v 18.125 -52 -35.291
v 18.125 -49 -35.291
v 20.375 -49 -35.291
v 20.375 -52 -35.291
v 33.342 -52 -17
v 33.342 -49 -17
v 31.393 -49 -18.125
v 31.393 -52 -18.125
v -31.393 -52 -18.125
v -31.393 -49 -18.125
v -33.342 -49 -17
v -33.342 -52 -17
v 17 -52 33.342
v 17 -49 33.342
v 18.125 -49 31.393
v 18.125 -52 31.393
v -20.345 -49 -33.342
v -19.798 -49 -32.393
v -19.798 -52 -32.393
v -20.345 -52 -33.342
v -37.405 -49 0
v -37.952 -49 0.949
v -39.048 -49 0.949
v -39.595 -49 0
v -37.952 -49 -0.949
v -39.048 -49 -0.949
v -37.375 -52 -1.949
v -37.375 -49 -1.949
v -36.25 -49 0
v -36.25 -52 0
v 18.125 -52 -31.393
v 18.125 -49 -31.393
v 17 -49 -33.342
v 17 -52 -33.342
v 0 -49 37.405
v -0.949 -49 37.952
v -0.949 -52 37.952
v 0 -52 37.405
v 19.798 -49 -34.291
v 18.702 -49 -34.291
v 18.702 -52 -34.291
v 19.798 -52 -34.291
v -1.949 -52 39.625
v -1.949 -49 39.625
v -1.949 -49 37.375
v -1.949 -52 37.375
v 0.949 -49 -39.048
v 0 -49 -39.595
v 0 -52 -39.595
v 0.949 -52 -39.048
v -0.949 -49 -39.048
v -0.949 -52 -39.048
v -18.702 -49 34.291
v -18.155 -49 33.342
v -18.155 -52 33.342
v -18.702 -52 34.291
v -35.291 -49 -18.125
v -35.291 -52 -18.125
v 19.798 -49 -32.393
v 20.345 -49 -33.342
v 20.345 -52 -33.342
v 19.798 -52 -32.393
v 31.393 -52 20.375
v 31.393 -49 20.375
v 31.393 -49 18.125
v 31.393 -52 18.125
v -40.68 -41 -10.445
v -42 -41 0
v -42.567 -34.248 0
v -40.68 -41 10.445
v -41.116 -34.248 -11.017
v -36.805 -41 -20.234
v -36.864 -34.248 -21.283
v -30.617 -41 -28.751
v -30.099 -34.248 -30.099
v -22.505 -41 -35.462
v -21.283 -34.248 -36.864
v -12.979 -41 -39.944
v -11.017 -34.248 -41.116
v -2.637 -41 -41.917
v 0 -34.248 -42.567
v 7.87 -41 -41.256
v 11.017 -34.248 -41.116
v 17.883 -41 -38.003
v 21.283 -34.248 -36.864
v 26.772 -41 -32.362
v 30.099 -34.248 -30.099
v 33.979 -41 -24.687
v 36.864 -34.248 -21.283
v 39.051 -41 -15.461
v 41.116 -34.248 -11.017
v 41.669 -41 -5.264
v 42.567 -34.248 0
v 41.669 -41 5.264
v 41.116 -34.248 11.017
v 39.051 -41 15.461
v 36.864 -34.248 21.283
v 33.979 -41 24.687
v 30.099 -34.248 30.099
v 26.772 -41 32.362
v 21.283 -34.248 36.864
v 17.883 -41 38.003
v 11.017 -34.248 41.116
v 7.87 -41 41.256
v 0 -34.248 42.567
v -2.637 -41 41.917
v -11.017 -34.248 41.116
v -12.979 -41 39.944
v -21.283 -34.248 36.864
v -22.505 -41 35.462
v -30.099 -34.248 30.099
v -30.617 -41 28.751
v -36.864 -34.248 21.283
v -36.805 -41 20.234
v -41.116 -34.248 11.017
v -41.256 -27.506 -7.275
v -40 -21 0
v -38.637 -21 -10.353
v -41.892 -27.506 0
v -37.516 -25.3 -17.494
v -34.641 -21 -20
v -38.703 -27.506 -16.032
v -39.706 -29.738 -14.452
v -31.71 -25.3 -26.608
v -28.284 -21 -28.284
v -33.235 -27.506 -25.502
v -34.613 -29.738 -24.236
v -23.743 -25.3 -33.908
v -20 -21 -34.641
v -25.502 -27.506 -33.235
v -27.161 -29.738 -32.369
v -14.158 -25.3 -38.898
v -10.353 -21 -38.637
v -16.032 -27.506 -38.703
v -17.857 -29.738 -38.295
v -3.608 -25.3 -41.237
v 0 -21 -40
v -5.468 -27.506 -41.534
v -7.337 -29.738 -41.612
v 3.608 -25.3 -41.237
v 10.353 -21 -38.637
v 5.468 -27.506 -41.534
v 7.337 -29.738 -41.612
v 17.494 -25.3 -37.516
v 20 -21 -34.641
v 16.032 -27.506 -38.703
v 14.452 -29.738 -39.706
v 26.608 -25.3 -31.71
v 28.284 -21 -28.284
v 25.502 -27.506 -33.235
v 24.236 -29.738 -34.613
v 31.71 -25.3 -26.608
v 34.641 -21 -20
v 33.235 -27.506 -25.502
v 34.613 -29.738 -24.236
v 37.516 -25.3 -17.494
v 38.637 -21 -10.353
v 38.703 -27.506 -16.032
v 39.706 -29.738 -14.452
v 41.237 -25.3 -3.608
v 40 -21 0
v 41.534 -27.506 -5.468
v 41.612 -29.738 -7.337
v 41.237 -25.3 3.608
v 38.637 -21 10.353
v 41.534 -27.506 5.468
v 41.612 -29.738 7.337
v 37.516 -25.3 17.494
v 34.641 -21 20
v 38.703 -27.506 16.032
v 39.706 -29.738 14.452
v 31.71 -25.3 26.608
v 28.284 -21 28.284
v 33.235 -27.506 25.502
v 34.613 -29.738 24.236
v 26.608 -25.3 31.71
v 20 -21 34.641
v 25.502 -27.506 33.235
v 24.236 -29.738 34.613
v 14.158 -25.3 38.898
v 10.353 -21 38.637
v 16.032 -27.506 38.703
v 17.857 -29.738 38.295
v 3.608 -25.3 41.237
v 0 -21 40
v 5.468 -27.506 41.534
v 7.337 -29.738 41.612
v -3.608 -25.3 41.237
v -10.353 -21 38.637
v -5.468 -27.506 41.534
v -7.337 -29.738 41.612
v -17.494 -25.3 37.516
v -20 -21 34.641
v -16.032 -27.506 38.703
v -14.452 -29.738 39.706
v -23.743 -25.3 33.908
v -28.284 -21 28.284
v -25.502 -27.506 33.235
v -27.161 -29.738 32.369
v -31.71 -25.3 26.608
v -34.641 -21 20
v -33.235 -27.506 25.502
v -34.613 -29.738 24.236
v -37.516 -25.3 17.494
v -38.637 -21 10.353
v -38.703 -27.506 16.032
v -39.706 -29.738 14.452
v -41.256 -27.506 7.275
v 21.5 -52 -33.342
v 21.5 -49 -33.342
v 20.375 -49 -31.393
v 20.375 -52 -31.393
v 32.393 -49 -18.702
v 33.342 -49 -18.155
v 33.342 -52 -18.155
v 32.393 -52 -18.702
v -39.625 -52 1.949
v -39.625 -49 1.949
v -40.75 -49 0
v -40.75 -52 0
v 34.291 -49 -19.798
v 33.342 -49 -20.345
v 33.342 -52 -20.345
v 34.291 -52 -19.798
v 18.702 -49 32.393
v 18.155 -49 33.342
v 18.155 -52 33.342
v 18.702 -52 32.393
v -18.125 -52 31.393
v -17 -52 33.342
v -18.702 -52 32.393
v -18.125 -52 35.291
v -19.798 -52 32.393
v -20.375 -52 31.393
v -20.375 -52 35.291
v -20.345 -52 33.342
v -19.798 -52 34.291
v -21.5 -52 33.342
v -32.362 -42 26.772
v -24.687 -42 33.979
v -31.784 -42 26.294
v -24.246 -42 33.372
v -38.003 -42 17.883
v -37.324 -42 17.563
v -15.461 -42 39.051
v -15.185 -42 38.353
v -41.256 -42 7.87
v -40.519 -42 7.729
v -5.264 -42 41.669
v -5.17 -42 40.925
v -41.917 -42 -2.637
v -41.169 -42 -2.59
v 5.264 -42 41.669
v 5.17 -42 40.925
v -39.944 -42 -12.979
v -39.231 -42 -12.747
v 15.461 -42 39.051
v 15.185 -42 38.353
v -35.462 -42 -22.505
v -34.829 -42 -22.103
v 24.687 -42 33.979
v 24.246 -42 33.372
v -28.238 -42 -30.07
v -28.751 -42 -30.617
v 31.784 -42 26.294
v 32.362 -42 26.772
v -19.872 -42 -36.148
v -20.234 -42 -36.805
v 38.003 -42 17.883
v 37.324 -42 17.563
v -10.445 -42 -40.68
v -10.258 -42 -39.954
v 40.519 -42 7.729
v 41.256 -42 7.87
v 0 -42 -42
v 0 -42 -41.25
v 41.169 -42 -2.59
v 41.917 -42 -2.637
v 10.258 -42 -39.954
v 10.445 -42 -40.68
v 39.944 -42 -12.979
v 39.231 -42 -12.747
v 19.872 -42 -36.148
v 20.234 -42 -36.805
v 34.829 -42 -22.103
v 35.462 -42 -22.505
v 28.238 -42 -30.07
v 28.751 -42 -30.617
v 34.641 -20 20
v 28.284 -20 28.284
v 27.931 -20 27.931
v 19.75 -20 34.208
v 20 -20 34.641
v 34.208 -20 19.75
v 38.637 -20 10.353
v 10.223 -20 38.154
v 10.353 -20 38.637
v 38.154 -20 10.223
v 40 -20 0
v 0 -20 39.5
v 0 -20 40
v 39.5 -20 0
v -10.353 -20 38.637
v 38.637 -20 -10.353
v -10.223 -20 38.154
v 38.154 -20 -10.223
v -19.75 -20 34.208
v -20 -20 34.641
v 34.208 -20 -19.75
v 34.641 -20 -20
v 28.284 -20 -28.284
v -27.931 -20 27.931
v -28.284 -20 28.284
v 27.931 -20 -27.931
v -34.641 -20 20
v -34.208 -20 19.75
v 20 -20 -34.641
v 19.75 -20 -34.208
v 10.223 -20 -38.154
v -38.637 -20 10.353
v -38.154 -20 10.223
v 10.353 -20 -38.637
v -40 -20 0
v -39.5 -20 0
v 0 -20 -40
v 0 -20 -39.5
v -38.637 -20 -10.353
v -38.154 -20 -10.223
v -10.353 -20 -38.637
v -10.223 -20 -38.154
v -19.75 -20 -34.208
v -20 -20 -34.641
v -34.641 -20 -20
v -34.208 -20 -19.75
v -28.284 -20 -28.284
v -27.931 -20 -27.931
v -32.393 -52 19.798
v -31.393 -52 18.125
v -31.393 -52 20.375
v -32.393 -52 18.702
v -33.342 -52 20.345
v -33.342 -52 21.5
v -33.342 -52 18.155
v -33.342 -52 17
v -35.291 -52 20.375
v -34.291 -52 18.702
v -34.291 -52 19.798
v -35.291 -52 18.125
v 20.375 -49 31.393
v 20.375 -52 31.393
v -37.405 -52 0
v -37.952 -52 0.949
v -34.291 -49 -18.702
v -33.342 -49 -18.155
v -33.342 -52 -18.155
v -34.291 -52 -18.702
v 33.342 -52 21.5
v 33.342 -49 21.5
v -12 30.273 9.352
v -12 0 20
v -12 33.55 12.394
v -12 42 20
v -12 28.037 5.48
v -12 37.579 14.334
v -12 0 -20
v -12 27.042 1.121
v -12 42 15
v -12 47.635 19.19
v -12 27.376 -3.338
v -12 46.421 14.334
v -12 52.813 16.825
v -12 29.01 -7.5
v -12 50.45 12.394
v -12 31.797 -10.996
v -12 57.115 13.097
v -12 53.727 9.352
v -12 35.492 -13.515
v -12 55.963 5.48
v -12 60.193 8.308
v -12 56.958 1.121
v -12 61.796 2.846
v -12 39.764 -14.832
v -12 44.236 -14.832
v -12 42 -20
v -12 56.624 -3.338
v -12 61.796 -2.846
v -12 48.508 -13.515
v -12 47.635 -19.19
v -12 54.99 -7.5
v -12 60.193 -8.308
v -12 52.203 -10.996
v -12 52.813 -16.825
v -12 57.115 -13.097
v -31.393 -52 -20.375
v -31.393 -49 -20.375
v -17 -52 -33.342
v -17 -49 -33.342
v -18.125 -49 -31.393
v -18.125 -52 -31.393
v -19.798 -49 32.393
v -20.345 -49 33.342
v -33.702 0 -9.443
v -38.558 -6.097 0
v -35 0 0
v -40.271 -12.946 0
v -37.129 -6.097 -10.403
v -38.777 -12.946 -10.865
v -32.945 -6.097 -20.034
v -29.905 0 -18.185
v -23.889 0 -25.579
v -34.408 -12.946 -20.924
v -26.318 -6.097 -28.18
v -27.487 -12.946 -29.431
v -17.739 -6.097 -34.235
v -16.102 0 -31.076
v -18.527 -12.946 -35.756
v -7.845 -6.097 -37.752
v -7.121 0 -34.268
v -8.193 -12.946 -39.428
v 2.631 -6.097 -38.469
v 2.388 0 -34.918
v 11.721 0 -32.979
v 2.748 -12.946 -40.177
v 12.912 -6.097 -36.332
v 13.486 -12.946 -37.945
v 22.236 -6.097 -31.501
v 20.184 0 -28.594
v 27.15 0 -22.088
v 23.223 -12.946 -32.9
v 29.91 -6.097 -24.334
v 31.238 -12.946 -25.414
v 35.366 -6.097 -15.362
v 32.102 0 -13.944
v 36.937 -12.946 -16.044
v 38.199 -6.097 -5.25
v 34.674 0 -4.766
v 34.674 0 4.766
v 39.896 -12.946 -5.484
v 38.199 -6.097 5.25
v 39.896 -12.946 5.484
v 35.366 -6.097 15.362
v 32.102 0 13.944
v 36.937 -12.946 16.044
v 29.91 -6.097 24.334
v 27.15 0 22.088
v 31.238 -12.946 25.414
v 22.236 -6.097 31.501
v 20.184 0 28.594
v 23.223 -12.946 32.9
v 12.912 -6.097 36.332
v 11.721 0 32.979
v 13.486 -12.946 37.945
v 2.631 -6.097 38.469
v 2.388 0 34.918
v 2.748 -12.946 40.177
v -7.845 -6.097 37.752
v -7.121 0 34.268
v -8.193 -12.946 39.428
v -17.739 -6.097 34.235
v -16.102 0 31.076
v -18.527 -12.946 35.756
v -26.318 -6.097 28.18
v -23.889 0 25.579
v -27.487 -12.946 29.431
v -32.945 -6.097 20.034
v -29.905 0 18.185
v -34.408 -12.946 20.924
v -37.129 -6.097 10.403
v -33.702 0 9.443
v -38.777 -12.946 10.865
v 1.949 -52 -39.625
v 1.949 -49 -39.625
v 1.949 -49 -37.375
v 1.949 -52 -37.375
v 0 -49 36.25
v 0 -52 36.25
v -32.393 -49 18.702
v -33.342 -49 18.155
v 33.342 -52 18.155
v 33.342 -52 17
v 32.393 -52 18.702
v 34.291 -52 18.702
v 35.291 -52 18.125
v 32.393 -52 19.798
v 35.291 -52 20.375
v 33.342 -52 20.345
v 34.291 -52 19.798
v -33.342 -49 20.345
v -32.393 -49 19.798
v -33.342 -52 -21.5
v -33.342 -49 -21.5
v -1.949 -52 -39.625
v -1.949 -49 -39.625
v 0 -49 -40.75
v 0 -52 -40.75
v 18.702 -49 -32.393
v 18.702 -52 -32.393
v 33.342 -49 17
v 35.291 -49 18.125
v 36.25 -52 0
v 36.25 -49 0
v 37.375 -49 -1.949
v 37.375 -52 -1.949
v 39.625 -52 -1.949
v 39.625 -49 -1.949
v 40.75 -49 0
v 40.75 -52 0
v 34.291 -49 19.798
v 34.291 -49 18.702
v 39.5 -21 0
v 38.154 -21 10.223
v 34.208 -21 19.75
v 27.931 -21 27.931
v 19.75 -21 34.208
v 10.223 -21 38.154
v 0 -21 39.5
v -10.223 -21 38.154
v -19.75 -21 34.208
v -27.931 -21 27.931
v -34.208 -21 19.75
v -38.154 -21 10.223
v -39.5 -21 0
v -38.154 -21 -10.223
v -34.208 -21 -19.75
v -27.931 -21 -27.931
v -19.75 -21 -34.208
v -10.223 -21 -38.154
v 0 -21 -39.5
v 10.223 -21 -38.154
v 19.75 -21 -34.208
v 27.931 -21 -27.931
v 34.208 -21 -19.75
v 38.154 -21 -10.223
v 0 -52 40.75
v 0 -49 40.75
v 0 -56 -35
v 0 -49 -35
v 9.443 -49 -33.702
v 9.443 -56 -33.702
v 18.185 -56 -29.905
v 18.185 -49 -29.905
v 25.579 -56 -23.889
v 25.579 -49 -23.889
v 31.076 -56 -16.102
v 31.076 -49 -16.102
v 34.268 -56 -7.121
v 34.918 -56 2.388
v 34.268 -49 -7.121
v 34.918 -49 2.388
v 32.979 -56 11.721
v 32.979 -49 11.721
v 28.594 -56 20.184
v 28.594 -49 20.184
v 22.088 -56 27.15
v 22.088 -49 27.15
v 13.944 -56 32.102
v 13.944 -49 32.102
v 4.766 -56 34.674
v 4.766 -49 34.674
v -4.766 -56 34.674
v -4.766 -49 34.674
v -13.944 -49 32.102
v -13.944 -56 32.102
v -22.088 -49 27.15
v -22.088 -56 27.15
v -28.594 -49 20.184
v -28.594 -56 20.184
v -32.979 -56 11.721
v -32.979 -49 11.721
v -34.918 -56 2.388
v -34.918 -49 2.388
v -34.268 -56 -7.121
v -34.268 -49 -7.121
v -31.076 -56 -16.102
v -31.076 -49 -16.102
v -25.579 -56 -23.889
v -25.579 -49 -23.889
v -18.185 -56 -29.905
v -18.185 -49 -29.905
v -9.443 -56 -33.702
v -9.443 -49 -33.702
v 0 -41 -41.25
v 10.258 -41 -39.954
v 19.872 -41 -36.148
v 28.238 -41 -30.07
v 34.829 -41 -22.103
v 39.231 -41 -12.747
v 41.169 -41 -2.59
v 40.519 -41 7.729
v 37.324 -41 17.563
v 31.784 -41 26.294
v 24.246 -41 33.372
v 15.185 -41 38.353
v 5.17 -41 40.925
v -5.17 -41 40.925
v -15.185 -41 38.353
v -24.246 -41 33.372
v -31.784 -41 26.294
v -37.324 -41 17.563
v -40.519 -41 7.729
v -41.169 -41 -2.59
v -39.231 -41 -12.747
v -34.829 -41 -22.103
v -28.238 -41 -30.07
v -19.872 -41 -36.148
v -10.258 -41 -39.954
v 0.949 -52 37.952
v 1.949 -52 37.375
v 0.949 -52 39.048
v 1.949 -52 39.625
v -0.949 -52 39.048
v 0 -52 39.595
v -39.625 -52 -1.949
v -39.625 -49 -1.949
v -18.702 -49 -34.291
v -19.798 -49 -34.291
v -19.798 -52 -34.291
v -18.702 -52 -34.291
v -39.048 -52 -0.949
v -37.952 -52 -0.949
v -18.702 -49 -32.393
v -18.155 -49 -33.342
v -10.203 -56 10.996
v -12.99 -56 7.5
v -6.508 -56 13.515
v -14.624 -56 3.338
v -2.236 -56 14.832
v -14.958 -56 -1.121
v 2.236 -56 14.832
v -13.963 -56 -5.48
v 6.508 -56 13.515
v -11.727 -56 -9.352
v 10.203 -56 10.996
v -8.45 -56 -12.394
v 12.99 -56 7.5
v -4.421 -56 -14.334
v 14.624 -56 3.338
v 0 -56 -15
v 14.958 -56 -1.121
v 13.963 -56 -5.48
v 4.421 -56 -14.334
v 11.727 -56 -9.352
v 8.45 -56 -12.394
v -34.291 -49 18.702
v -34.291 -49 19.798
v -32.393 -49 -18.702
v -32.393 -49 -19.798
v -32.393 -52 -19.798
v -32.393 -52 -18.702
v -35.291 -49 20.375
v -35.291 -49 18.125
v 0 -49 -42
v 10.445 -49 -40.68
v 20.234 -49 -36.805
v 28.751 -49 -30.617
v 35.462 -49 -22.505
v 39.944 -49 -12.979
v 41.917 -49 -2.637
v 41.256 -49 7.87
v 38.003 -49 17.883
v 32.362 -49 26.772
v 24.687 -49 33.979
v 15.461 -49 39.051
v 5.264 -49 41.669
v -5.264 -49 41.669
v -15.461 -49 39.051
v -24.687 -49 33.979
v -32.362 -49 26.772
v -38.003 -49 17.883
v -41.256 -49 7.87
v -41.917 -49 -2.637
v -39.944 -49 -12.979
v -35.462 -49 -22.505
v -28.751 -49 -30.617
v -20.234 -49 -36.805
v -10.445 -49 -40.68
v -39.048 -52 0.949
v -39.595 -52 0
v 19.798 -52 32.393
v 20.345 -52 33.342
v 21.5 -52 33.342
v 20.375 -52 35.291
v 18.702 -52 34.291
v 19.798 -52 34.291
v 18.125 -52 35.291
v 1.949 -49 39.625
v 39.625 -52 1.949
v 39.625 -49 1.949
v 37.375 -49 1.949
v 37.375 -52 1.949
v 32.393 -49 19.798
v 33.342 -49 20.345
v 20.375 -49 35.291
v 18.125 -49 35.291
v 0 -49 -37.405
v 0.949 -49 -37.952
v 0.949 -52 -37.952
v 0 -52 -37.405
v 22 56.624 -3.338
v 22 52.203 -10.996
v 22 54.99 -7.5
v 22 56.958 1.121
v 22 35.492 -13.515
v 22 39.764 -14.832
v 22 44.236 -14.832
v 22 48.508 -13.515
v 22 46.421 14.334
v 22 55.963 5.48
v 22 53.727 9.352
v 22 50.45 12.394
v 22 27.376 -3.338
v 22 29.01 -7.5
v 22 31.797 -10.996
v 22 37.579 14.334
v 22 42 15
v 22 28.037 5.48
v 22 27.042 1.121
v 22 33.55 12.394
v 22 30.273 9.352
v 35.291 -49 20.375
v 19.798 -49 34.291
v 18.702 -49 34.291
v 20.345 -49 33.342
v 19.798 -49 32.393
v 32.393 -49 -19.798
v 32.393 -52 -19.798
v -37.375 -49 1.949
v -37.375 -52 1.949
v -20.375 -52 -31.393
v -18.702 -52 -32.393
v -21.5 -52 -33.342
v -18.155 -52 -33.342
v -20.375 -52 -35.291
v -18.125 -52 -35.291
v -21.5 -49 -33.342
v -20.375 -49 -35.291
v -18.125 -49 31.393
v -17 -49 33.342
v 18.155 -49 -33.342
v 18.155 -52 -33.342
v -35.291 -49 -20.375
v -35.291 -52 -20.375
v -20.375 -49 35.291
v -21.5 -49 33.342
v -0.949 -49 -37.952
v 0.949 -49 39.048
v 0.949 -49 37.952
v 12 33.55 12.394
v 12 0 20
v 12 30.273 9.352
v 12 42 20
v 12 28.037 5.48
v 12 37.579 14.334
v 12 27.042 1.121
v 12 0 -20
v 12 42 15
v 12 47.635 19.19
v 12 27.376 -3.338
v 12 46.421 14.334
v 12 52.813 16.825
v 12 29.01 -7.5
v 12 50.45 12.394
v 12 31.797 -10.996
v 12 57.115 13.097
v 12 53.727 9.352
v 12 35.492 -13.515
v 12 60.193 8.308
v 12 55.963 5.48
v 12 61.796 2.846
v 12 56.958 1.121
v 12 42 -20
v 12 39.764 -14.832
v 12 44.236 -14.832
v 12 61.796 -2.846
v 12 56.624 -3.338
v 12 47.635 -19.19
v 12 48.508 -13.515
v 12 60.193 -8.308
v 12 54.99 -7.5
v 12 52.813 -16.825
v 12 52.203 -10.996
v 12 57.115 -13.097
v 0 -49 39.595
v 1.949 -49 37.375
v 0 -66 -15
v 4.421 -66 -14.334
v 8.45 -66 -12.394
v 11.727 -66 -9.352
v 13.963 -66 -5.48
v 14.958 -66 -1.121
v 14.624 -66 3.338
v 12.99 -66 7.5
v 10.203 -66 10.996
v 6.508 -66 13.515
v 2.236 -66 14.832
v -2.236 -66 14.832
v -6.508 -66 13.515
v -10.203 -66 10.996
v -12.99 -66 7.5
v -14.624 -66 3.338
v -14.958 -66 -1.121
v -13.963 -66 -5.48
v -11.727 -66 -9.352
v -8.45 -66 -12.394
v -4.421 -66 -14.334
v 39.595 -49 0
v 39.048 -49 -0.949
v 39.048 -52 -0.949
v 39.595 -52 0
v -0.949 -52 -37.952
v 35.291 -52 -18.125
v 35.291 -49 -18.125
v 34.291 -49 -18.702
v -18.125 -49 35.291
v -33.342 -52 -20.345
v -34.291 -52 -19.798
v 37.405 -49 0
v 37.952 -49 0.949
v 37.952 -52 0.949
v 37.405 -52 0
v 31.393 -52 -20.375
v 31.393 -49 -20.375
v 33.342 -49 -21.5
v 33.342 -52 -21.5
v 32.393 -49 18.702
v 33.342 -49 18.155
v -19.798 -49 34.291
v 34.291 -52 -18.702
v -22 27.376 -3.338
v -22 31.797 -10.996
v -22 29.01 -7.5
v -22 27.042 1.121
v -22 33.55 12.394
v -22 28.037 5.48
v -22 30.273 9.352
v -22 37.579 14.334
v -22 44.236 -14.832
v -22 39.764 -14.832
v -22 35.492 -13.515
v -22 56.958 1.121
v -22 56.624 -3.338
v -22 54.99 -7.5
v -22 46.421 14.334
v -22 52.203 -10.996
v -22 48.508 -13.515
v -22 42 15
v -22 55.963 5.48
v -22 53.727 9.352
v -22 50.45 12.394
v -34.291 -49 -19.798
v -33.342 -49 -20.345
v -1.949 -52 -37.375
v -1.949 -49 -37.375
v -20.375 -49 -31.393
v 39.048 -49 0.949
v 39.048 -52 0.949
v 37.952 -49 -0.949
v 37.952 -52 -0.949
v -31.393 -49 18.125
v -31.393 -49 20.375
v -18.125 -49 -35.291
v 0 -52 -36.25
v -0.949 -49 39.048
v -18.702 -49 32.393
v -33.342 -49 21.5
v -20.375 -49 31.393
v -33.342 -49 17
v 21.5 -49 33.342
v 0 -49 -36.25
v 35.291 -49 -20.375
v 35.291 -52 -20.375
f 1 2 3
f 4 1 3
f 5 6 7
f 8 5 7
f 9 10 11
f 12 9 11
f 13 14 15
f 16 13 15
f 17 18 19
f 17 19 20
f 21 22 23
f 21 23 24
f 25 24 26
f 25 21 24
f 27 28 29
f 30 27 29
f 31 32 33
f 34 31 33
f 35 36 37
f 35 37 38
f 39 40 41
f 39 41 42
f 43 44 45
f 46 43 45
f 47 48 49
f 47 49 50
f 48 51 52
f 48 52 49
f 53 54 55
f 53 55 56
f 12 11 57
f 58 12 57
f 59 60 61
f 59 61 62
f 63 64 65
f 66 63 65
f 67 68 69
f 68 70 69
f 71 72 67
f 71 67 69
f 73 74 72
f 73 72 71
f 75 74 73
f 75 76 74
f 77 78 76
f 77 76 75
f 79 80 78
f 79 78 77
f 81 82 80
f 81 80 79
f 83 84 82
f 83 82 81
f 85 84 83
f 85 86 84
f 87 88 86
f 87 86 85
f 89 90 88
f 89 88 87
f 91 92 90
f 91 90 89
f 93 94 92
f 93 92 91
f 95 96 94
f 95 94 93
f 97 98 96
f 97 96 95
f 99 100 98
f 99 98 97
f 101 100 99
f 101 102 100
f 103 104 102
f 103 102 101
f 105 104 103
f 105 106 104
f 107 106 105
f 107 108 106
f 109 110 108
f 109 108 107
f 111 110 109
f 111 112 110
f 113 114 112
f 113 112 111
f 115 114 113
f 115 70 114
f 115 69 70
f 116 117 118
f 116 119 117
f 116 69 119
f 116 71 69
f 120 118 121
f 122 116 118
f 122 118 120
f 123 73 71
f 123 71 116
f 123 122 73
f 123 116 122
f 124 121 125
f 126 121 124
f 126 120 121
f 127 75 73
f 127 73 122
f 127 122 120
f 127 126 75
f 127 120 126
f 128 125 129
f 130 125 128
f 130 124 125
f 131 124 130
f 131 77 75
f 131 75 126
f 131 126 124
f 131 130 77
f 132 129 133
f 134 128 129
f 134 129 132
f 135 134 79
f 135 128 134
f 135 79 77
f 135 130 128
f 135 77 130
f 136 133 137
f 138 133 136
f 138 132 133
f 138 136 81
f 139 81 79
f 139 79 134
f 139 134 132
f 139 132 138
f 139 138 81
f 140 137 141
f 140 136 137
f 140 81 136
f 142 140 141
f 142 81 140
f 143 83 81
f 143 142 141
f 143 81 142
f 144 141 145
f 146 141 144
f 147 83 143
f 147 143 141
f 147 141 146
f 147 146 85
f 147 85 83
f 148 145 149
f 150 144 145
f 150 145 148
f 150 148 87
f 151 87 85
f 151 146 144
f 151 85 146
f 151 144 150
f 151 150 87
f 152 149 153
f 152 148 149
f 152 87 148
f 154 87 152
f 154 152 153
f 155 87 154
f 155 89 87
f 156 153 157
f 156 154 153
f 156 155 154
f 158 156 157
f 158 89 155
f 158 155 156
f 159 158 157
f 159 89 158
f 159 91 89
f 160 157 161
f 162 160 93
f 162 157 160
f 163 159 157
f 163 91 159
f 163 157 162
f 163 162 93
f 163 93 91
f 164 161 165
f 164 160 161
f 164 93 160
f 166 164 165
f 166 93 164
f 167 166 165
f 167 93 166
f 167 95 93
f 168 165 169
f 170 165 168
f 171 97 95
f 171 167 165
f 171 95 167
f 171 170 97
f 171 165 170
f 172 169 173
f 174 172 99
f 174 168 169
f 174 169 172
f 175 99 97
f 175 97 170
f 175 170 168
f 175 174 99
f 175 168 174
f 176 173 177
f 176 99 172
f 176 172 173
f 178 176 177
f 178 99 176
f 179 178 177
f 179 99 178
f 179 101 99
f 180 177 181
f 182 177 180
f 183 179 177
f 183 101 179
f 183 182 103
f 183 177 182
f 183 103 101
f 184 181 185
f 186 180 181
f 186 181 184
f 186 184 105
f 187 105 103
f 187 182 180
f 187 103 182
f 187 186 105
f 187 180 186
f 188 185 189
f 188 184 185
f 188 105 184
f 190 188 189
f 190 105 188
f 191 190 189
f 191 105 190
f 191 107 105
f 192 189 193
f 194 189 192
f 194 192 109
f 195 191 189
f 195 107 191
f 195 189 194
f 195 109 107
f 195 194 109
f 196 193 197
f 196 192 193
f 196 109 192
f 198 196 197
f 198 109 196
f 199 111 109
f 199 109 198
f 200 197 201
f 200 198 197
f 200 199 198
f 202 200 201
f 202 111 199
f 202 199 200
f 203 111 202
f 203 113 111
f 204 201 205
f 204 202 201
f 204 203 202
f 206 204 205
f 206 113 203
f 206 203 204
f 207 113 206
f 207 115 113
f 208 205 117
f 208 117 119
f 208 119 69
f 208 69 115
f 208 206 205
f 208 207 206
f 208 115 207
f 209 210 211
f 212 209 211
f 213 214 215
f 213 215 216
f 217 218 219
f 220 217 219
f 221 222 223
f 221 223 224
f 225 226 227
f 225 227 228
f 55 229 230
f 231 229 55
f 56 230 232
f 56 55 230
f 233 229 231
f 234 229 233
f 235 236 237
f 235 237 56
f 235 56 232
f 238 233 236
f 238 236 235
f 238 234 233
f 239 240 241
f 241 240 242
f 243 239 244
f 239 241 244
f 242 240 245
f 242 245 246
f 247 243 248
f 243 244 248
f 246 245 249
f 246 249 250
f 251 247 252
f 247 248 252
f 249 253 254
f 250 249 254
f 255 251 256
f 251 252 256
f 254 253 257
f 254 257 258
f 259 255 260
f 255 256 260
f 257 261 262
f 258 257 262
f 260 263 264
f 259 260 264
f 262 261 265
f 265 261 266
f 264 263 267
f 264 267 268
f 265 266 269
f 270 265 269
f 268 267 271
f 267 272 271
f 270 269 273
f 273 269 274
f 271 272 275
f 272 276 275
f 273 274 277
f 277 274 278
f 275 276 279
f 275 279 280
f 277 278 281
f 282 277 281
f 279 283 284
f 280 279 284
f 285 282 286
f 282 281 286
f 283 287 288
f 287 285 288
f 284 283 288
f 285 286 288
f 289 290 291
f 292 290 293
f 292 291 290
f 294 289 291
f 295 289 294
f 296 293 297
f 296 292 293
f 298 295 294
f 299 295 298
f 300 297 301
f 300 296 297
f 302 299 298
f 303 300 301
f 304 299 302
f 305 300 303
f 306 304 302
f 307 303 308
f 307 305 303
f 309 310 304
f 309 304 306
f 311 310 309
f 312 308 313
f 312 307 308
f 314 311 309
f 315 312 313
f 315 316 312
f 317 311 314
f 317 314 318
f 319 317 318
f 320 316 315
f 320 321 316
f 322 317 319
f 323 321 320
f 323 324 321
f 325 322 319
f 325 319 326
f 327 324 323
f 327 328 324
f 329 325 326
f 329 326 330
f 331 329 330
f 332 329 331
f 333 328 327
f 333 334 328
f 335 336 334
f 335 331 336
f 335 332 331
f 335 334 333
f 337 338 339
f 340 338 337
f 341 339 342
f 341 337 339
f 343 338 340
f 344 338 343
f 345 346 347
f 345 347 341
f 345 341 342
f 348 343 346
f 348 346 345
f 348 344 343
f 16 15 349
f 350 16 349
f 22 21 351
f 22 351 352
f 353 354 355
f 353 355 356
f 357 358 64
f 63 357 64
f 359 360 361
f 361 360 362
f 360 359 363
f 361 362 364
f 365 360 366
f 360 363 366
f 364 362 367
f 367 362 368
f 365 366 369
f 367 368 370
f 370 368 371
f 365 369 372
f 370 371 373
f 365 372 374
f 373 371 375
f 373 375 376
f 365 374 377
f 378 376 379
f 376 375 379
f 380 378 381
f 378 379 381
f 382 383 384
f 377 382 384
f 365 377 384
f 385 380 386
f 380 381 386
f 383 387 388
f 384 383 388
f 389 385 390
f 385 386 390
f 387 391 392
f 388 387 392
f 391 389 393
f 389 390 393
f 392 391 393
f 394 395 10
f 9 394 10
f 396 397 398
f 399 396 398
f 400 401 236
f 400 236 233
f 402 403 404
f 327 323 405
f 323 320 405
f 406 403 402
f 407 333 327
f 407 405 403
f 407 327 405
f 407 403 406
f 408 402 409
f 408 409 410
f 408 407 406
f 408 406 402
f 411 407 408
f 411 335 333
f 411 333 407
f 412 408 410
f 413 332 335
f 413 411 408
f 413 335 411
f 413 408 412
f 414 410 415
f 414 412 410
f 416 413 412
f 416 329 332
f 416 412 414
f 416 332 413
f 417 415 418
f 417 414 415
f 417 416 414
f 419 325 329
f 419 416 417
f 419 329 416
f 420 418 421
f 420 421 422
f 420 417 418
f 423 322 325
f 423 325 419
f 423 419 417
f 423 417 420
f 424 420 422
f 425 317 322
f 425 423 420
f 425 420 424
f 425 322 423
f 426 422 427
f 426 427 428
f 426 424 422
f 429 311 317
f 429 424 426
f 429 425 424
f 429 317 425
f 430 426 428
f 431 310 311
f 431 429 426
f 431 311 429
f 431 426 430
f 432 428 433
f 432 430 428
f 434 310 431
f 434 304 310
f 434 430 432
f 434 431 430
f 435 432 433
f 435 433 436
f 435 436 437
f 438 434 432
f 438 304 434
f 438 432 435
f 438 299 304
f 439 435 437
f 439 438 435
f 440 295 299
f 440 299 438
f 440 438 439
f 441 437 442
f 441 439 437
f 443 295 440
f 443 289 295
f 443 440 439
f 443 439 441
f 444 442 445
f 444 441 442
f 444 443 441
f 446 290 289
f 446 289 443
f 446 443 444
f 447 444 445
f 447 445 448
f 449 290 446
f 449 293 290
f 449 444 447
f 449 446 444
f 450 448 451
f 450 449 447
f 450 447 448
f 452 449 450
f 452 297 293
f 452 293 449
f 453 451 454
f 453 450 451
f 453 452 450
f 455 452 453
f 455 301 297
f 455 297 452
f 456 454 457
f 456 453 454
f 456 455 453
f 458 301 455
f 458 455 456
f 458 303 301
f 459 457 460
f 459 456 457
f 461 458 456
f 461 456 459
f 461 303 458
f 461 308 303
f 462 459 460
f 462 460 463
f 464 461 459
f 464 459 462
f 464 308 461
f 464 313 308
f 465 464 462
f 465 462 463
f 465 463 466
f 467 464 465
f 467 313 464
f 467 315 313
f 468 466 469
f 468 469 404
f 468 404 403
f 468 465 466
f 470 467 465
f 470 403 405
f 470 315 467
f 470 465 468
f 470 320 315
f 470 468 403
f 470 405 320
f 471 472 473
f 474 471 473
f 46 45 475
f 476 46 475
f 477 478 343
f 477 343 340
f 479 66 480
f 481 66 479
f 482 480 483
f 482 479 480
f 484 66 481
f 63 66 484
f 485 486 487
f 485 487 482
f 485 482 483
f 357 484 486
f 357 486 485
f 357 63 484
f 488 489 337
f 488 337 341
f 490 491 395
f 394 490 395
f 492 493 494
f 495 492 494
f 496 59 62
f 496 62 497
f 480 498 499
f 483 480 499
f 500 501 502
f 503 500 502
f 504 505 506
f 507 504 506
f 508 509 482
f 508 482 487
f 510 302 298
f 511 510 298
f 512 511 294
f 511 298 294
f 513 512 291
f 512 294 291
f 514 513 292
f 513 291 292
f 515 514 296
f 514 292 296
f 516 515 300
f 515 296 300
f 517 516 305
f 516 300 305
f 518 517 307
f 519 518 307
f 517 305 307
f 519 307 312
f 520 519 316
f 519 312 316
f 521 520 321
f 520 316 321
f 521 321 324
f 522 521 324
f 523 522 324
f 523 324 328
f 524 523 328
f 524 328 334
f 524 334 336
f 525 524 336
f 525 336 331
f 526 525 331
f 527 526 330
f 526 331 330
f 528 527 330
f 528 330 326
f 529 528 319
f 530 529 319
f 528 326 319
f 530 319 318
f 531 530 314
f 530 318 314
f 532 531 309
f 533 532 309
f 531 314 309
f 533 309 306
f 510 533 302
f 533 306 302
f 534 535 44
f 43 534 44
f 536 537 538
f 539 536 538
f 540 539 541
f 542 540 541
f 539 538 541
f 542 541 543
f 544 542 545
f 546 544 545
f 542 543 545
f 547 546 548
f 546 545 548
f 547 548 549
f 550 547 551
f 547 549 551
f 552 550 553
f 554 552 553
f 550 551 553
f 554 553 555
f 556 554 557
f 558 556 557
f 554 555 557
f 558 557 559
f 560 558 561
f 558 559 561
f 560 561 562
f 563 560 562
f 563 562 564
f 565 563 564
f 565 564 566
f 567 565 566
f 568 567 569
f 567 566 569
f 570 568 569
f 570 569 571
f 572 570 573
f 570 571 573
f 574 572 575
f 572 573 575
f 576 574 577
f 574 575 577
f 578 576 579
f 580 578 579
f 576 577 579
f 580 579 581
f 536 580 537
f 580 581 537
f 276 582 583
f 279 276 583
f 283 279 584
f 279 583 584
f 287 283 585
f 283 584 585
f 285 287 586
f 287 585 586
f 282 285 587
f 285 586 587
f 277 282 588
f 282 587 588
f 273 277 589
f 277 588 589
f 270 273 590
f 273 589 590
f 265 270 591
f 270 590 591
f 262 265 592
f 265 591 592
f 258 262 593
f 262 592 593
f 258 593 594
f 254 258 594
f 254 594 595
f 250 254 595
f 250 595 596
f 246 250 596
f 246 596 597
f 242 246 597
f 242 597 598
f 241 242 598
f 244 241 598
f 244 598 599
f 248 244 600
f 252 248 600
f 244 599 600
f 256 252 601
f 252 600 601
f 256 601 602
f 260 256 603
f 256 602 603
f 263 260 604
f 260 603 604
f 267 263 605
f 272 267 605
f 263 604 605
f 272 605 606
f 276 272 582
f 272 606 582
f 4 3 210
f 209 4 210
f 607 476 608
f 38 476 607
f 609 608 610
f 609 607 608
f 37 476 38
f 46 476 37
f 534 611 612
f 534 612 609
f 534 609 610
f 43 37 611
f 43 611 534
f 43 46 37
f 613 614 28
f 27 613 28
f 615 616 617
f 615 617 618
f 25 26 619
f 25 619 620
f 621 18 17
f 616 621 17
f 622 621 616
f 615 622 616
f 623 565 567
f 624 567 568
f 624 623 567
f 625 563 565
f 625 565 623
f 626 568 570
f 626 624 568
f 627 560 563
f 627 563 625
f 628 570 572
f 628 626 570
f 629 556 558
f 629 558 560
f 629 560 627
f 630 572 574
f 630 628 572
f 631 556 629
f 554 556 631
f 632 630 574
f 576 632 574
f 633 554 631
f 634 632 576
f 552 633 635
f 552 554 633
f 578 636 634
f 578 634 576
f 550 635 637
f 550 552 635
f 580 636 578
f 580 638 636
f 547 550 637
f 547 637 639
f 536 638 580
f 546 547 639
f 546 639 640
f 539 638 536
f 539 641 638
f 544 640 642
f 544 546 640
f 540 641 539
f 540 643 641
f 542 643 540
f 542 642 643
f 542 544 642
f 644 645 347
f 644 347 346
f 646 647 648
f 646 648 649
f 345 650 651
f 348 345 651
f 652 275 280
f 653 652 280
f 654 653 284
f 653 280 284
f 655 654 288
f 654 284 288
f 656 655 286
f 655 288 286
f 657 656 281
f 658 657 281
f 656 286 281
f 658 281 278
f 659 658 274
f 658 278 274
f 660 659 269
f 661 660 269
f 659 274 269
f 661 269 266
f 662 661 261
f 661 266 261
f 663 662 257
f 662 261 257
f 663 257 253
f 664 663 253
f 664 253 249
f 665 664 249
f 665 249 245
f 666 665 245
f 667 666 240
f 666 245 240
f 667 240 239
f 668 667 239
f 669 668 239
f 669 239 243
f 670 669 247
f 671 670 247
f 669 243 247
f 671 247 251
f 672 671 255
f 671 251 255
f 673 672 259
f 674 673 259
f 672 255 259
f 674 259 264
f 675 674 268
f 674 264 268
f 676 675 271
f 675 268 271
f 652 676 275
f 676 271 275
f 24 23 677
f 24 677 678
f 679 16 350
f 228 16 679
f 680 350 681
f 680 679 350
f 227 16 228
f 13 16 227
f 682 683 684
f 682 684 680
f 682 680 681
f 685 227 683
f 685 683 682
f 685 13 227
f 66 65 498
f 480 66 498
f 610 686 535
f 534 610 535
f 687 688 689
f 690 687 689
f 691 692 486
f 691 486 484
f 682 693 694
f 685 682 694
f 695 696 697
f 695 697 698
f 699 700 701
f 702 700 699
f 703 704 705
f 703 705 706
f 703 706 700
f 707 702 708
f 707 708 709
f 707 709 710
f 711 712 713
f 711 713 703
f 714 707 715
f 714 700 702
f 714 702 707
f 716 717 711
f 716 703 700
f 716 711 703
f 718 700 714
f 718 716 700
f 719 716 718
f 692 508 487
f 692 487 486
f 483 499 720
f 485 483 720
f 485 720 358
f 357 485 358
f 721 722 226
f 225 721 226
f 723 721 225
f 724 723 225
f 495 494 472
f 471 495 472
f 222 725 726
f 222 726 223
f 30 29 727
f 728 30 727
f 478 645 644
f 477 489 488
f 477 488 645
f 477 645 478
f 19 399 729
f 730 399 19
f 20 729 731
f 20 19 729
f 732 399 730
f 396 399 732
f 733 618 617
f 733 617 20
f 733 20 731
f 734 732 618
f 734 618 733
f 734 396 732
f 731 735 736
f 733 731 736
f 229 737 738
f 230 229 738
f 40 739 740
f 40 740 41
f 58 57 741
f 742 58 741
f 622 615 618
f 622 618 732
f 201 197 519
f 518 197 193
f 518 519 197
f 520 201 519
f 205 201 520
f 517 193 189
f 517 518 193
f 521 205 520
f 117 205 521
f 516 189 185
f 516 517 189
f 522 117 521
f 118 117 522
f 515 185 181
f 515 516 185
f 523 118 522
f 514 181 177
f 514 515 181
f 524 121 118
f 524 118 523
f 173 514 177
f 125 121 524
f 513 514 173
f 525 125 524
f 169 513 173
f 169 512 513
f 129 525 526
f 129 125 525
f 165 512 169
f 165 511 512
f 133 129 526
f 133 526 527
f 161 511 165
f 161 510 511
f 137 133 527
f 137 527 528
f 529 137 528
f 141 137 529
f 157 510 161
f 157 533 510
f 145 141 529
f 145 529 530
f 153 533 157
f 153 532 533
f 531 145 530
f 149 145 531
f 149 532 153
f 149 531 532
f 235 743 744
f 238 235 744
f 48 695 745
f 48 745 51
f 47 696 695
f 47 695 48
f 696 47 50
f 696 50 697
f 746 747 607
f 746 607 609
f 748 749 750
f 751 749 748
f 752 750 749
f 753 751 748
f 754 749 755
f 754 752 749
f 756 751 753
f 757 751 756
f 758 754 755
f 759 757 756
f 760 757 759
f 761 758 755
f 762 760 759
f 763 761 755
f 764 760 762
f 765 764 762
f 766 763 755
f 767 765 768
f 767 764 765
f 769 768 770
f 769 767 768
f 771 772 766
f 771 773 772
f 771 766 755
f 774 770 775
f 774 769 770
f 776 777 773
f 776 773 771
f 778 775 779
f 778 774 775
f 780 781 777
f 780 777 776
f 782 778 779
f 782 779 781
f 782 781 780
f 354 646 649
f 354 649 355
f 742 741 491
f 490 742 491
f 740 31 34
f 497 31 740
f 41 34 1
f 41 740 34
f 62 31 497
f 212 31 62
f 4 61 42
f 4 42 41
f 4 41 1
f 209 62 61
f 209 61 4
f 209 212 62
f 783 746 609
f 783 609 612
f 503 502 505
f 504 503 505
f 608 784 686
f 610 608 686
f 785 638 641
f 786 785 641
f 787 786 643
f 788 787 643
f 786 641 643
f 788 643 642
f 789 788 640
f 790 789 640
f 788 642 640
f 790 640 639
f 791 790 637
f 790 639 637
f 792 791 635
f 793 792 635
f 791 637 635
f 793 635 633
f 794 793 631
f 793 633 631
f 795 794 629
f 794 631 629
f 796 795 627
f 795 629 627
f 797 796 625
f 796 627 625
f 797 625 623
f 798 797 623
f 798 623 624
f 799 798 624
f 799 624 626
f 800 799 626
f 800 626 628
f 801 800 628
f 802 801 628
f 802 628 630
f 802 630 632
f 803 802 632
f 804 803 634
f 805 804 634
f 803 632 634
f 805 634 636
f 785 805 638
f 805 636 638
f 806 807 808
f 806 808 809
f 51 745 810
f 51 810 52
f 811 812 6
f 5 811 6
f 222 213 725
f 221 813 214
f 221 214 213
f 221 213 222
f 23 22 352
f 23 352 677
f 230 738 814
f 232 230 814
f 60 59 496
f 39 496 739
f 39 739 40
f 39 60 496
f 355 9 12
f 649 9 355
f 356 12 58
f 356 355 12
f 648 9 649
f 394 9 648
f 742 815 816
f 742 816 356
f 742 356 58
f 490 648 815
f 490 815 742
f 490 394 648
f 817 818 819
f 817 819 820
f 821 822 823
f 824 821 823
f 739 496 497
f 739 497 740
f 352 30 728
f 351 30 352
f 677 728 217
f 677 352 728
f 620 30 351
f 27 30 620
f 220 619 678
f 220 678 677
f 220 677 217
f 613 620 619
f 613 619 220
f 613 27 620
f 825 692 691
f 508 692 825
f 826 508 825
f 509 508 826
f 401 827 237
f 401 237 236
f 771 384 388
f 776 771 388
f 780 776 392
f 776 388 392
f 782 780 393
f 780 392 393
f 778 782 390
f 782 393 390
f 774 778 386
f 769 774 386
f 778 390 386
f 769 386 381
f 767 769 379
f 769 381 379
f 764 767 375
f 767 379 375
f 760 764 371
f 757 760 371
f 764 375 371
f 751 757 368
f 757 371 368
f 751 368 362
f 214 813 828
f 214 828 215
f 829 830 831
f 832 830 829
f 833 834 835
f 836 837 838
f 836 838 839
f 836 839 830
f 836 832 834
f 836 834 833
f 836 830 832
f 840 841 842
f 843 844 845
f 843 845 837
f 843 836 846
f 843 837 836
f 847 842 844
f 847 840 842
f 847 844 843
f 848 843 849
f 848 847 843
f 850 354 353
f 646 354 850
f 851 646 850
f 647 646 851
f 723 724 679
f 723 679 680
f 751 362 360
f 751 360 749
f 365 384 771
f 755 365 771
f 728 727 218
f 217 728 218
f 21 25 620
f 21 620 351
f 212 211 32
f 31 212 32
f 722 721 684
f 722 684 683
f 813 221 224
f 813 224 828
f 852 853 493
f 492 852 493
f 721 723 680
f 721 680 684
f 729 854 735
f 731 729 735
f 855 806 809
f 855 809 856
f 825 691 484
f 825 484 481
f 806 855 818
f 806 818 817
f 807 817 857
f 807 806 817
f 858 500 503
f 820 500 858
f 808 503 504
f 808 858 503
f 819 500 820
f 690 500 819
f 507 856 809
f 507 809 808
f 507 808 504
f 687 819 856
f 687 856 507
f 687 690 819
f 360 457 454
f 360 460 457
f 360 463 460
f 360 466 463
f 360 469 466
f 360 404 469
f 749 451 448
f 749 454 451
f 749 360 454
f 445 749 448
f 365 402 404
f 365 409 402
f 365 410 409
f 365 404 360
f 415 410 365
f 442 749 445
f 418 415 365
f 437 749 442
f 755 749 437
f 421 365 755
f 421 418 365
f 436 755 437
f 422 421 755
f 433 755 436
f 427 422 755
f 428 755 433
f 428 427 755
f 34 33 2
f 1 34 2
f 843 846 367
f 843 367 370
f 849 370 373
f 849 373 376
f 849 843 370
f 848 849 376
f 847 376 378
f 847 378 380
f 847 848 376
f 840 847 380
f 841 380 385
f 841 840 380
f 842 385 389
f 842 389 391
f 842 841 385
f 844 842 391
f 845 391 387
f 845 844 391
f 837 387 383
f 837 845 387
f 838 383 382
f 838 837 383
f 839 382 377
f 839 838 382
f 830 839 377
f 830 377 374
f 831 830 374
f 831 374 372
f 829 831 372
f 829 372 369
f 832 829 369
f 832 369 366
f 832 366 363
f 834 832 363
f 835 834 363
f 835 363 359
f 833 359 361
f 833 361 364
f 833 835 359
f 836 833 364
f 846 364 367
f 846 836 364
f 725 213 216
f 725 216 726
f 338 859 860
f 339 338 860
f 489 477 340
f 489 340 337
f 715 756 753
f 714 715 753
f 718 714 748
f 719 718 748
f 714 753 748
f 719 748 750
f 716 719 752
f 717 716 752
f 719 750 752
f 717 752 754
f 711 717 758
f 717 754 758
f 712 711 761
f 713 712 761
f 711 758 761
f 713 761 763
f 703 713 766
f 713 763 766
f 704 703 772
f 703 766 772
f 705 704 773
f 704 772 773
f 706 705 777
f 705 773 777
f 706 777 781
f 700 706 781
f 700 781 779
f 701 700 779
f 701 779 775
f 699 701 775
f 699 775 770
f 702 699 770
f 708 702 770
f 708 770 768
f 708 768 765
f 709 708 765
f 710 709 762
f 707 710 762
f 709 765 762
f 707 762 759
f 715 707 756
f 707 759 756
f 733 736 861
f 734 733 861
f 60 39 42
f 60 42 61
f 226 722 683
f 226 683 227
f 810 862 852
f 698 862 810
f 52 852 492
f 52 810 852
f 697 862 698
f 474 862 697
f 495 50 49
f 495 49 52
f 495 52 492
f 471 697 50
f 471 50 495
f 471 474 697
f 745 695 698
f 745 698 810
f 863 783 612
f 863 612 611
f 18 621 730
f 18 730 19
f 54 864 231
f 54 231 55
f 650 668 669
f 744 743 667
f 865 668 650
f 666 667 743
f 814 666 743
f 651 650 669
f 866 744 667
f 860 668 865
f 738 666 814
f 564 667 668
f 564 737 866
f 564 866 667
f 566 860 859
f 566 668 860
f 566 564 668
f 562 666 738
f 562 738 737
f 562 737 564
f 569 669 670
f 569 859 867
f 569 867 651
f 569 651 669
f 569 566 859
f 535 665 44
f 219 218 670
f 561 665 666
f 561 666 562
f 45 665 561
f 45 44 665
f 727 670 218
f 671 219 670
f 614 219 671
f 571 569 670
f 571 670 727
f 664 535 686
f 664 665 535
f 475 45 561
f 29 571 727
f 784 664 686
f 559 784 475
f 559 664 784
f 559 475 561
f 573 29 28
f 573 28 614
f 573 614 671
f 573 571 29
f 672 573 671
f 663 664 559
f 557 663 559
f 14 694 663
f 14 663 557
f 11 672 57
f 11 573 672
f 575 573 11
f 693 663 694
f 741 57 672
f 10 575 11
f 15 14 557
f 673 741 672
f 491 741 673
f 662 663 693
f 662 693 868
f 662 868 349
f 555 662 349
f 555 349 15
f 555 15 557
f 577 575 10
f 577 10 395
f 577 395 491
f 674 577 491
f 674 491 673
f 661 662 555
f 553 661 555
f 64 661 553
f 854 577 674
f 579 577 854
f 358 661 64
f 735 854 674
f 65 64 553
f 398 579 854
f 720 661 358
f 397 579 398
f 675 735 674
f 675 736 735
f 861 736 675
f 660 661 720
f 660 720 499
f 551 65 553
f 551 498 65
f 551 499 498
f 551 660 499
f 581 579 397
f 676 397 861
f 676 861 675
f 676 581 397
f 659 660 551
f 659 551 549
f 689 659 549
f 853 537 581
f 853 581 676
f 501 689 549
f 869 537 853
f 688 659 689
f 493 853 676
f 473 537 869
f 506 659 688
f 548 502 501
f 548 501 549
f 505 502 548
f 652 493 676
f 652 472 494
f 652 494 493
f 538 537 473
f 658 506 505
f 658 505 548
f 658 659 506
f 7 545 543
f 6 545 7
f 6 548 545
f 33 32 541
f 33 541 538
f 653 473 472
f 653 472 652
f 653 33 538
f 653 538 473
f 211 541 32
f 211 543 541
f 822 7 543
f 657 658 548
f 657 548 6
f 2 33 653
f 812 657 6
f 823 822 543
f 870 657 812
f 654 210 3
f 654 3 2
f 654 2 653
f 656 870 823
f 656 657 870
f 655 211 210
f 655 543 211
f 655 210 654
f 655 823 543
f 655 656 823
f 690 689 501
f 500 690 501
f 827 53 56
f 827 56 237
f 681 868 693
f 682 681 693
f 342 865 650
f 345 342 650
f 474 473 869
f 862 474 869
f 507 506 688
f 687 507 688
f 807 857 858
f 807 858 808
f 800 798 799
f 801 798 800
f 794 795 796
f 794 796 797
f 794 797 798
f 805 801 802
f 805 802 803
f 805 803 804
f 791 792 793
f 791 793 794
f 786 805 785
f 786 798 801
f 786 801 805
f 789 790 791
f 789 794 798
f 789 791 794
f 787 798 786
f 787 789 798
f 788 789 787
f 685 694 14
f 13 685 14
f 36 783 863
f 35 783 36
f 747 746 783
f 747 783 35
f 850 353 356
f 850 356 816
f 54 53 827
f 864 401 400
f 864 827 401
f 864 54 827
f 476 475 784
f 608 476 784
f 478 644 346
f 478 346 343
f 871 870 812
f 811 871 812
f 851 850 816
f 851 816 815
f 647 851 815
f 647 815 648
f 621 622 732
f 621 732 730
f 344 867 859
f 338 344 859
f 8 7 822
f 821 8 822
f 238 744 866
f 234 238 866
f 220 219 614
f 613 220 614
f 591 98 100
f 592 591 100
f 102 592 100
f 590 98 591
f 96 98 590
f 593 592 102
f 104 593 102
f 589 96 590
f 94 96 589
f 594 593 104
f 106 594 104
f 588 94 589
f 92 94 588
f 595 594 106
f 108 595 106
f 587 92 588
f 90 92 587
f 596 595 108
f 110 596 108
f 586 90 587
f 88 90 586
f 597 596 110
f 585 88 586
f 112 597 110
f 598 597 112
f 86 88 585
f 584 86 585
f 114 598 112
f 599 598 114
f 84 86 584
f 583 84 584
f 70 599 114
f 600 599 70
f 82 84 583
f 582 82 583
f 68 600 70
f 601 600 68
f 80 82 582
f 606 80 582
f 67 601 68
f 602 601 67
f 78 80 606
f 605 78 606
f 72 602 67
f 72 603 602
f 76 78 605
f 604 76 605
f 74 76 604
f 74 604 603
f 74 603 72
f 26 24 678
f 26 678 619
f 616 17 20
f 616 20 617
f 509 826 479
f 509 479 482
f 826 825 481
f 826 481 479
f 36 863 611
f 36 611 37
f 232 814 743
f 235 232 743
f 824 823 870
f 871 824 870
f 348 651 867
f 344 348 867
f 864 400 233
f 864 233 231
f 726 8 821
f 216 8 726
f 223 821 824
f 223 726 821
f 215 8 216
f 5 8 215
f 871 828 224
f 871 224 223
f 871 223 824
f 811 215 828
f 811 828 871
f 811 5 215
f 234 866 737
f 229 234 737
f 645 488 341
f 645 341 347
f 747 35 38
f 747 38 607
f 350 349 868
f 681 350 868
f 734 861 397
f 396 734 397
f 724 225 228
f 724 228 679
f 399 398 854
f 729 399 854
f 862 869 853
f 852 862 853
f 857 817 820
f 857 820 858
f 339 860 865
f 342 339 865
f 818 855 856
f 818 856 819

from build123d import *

# Parameters (mm, degrees)
SKETCH2_R            = 39.5
BOSS_EXTRUDE1_DEPTH  = 1
SKETCH4_R            = 41.25
BOSS_EXTRUDE2_DEPTH  = 1
SKETCH5_R            = 42
BOSS_EXTRUDE3_DEPTH  = 7
SKETCH6_R            = 35
BOSS_EXTRUDE4_DEPTH  = 7
BOSS_EXTRUDE5_DEPTH  = 3
CIRPATTERN1_COUNT    = 12
SKETCH8_R            = 15
BOSS_EXTRUDE6_DEPTH  = 10
SKETCH9_W            = 24
SKETCH9_H            = 40
BOSS_EXTRUDE7_DEPTH  = 42
BOSS_EXTRUDE8_START  = -24
BOSS_EXTRUDE8_DEPTH  = 24
SKETCH11_R           = 15
BOSS_EXTRUDE9_DEPTH  = 10
BOSS_EXTRUDE10_START = 10
SKETCH12_R           = 15
BOSS_EXTRUDE10_DEPTH = 10


with BuildPart() as part:
    # Sketch1 → Revolve1 (revolve)
    with BuildSketch(Plane.XY):
        with BuildLine():
            Line((0, 0), (-35, 0))
            ThreePointArc((-35, 0), (-39.657515479, -9.46062113), (-40, -20))
            Line((-40, -20), (0, -20))
            Line((0, -20), (0, 0))
        make_face()
    revolve(axis=Axis((0, 0, 0), (0, -1, 0)))

    # Sketch2 → Boss-Extrude1 (add)
    with BuildSketch(Plane.XZ.offset(20)):
        Circle(SKETCH2_R)
    extrude(amount=BOSS_EXTRUDE1_DEPTH)

    # Sketch3 → Revolve3 (revolve)
    with BuildSketch(Plane(origin=(0, 0, 0), x_dir=(0, 0, -1), z_dir=(1, 0, 0)), mode=Mode.PRIVATE) as revolve3_sk:
        with BuildLine():
            Line((0, -21), (-40, -21))
            ThreePointArc((-40, -21), (-42.384109041, -30.861589096), (-42, -41))
            Line((-42, -41), (0, -41))
            Line((0, -41), (0, -21))
        make_face()
    revolve(revolve3_sk.sketch.rotate(Axis((0, -21, 0), (0, -1, 0)), 90), axis=Axis((0, -21, 0), (0, -1, 0)))

    # Sketch4 → Boss-Extrude2 (add)
    with BuildSketch(Plane.XZ.offset(41)):
        with Locations(Location((0, 0, 0), (0, 0, 270))):
            Circle(SKETCH4_R)
    extrude(amount=BOSS_EXTRUDE2_DEPTH)

    # Sketch5 → Boss-Extrude3 (add)
    with BuildSketch(Plane.XZ.offset(42)):
        with Locations(Location((0, 0, 0), (0, 0, 270))):
            Circle(SKETCH5_R)
    extrude(amount=BOSS_EXTRUDE3_DEPTH)

    # Sketch6 → Boss-Extrude4 (add)
    with BuildSketch(Plane.XZ.offset(49)):
        with Locations(Location((0, 0, 0), (0, 0, 270))):
            Circle(SKETCH6_R)
    extrude(amount=BOSS_EXTRUDE4_DEPTH)

    # Sketch7 → Boss-Extrude5 (add)
    with BuildSketch(Plane.XZ.offset(49)):
        Polygon((36.25, 0), (37.375, -1.948557159), (39.625, -1.948557159), (40.75, 0), (39.625, 1.948557159), (37.375, 1.948557159), align=None)
        Polygon((37.952350269, 0.948557159), (37.404700538, 0), (37.952350269, -0.948557159), (39.047649731, -0.948557159), (39.595299462, 0), (39.047649731, 0.948557159), align=None, mode=Mode.SUBTRACT)
    boss_extrude5 = extrude(amount=BOSS_EXTRUDE5_DEPTH)

    # CirPattern1: Boss-Extrude5 ×12 about axis
    cirpattern1_axis = Axis((0, 0, 0), (0, 1, 0))
    for i in range(1, CIRPATTERN1_COUNT):
        add(boss_extrude5.rotate(cirpattern1_axis, i * 360 / CIRPATTERN1_COUNT))

    # Sketch8 → Boss-Extrude6 (add)
    with BuildSketch(Plane.XZ.offset(56)):
        with Locations(Location((0, 0, 0), (0, 0, 270))):
            Circle(SKETCH8_R)
    extrude(amount=BOSS_EXTRUDE6_DEPTH)

    # Sketch9 → Boss-Extrude7 (add)
    with BuildSketch(Plane(origin=(0, 0, 0), x_dir=(1, 0, 0), z_dir=(0, 1, 0))):
        Rectangle(SKETCH9_W, SKETCH9_H)
    extrude(amount=BOSS_EXTRUDE7_DEPTH)

    # Sketch10 → Boss-Extrude8 (add)
    with BuildSketch(Plane(origin=(12, 0, 0), x_dir=(0, 0, -1), z_dir=(1, 0, 0)).offset(BOSS_EXTRUDE8_START)):
        with BuildLine():
            Line((-20, 42), (20, 42))
            ThreePointArc((20, 42), (0, 62), (-20, 42))
        make_face()
    extrude(amount=BOSS_EXTRUDE8_DEPTH)

    # Sketch11 → Boss-Extrude9 (add)
    with BuildSketch(Plane(origin=(12, 0, 0), x_dir=(0, 0, -1), z_dir=(1, 0, 0))):
        with Locations(Location((0, 42, 0), (0, 0, 180))):
            Circle(SKETCH11_R)
    extrude(amount=BOSS_EXTRUDE9_DEPTH)

    # Sketch12 → Boss-Extrude10 (add)
    with BuildSketch(Plane.ZY.offset(12).offset(BOSS_EXTRUDE10_START)):
        with Locations((0, 42)):
            Circle(SKETCH12_R)
    extrude(amount=-BOSS_EXTRUDE10_DEPTH)


solid = part.part
